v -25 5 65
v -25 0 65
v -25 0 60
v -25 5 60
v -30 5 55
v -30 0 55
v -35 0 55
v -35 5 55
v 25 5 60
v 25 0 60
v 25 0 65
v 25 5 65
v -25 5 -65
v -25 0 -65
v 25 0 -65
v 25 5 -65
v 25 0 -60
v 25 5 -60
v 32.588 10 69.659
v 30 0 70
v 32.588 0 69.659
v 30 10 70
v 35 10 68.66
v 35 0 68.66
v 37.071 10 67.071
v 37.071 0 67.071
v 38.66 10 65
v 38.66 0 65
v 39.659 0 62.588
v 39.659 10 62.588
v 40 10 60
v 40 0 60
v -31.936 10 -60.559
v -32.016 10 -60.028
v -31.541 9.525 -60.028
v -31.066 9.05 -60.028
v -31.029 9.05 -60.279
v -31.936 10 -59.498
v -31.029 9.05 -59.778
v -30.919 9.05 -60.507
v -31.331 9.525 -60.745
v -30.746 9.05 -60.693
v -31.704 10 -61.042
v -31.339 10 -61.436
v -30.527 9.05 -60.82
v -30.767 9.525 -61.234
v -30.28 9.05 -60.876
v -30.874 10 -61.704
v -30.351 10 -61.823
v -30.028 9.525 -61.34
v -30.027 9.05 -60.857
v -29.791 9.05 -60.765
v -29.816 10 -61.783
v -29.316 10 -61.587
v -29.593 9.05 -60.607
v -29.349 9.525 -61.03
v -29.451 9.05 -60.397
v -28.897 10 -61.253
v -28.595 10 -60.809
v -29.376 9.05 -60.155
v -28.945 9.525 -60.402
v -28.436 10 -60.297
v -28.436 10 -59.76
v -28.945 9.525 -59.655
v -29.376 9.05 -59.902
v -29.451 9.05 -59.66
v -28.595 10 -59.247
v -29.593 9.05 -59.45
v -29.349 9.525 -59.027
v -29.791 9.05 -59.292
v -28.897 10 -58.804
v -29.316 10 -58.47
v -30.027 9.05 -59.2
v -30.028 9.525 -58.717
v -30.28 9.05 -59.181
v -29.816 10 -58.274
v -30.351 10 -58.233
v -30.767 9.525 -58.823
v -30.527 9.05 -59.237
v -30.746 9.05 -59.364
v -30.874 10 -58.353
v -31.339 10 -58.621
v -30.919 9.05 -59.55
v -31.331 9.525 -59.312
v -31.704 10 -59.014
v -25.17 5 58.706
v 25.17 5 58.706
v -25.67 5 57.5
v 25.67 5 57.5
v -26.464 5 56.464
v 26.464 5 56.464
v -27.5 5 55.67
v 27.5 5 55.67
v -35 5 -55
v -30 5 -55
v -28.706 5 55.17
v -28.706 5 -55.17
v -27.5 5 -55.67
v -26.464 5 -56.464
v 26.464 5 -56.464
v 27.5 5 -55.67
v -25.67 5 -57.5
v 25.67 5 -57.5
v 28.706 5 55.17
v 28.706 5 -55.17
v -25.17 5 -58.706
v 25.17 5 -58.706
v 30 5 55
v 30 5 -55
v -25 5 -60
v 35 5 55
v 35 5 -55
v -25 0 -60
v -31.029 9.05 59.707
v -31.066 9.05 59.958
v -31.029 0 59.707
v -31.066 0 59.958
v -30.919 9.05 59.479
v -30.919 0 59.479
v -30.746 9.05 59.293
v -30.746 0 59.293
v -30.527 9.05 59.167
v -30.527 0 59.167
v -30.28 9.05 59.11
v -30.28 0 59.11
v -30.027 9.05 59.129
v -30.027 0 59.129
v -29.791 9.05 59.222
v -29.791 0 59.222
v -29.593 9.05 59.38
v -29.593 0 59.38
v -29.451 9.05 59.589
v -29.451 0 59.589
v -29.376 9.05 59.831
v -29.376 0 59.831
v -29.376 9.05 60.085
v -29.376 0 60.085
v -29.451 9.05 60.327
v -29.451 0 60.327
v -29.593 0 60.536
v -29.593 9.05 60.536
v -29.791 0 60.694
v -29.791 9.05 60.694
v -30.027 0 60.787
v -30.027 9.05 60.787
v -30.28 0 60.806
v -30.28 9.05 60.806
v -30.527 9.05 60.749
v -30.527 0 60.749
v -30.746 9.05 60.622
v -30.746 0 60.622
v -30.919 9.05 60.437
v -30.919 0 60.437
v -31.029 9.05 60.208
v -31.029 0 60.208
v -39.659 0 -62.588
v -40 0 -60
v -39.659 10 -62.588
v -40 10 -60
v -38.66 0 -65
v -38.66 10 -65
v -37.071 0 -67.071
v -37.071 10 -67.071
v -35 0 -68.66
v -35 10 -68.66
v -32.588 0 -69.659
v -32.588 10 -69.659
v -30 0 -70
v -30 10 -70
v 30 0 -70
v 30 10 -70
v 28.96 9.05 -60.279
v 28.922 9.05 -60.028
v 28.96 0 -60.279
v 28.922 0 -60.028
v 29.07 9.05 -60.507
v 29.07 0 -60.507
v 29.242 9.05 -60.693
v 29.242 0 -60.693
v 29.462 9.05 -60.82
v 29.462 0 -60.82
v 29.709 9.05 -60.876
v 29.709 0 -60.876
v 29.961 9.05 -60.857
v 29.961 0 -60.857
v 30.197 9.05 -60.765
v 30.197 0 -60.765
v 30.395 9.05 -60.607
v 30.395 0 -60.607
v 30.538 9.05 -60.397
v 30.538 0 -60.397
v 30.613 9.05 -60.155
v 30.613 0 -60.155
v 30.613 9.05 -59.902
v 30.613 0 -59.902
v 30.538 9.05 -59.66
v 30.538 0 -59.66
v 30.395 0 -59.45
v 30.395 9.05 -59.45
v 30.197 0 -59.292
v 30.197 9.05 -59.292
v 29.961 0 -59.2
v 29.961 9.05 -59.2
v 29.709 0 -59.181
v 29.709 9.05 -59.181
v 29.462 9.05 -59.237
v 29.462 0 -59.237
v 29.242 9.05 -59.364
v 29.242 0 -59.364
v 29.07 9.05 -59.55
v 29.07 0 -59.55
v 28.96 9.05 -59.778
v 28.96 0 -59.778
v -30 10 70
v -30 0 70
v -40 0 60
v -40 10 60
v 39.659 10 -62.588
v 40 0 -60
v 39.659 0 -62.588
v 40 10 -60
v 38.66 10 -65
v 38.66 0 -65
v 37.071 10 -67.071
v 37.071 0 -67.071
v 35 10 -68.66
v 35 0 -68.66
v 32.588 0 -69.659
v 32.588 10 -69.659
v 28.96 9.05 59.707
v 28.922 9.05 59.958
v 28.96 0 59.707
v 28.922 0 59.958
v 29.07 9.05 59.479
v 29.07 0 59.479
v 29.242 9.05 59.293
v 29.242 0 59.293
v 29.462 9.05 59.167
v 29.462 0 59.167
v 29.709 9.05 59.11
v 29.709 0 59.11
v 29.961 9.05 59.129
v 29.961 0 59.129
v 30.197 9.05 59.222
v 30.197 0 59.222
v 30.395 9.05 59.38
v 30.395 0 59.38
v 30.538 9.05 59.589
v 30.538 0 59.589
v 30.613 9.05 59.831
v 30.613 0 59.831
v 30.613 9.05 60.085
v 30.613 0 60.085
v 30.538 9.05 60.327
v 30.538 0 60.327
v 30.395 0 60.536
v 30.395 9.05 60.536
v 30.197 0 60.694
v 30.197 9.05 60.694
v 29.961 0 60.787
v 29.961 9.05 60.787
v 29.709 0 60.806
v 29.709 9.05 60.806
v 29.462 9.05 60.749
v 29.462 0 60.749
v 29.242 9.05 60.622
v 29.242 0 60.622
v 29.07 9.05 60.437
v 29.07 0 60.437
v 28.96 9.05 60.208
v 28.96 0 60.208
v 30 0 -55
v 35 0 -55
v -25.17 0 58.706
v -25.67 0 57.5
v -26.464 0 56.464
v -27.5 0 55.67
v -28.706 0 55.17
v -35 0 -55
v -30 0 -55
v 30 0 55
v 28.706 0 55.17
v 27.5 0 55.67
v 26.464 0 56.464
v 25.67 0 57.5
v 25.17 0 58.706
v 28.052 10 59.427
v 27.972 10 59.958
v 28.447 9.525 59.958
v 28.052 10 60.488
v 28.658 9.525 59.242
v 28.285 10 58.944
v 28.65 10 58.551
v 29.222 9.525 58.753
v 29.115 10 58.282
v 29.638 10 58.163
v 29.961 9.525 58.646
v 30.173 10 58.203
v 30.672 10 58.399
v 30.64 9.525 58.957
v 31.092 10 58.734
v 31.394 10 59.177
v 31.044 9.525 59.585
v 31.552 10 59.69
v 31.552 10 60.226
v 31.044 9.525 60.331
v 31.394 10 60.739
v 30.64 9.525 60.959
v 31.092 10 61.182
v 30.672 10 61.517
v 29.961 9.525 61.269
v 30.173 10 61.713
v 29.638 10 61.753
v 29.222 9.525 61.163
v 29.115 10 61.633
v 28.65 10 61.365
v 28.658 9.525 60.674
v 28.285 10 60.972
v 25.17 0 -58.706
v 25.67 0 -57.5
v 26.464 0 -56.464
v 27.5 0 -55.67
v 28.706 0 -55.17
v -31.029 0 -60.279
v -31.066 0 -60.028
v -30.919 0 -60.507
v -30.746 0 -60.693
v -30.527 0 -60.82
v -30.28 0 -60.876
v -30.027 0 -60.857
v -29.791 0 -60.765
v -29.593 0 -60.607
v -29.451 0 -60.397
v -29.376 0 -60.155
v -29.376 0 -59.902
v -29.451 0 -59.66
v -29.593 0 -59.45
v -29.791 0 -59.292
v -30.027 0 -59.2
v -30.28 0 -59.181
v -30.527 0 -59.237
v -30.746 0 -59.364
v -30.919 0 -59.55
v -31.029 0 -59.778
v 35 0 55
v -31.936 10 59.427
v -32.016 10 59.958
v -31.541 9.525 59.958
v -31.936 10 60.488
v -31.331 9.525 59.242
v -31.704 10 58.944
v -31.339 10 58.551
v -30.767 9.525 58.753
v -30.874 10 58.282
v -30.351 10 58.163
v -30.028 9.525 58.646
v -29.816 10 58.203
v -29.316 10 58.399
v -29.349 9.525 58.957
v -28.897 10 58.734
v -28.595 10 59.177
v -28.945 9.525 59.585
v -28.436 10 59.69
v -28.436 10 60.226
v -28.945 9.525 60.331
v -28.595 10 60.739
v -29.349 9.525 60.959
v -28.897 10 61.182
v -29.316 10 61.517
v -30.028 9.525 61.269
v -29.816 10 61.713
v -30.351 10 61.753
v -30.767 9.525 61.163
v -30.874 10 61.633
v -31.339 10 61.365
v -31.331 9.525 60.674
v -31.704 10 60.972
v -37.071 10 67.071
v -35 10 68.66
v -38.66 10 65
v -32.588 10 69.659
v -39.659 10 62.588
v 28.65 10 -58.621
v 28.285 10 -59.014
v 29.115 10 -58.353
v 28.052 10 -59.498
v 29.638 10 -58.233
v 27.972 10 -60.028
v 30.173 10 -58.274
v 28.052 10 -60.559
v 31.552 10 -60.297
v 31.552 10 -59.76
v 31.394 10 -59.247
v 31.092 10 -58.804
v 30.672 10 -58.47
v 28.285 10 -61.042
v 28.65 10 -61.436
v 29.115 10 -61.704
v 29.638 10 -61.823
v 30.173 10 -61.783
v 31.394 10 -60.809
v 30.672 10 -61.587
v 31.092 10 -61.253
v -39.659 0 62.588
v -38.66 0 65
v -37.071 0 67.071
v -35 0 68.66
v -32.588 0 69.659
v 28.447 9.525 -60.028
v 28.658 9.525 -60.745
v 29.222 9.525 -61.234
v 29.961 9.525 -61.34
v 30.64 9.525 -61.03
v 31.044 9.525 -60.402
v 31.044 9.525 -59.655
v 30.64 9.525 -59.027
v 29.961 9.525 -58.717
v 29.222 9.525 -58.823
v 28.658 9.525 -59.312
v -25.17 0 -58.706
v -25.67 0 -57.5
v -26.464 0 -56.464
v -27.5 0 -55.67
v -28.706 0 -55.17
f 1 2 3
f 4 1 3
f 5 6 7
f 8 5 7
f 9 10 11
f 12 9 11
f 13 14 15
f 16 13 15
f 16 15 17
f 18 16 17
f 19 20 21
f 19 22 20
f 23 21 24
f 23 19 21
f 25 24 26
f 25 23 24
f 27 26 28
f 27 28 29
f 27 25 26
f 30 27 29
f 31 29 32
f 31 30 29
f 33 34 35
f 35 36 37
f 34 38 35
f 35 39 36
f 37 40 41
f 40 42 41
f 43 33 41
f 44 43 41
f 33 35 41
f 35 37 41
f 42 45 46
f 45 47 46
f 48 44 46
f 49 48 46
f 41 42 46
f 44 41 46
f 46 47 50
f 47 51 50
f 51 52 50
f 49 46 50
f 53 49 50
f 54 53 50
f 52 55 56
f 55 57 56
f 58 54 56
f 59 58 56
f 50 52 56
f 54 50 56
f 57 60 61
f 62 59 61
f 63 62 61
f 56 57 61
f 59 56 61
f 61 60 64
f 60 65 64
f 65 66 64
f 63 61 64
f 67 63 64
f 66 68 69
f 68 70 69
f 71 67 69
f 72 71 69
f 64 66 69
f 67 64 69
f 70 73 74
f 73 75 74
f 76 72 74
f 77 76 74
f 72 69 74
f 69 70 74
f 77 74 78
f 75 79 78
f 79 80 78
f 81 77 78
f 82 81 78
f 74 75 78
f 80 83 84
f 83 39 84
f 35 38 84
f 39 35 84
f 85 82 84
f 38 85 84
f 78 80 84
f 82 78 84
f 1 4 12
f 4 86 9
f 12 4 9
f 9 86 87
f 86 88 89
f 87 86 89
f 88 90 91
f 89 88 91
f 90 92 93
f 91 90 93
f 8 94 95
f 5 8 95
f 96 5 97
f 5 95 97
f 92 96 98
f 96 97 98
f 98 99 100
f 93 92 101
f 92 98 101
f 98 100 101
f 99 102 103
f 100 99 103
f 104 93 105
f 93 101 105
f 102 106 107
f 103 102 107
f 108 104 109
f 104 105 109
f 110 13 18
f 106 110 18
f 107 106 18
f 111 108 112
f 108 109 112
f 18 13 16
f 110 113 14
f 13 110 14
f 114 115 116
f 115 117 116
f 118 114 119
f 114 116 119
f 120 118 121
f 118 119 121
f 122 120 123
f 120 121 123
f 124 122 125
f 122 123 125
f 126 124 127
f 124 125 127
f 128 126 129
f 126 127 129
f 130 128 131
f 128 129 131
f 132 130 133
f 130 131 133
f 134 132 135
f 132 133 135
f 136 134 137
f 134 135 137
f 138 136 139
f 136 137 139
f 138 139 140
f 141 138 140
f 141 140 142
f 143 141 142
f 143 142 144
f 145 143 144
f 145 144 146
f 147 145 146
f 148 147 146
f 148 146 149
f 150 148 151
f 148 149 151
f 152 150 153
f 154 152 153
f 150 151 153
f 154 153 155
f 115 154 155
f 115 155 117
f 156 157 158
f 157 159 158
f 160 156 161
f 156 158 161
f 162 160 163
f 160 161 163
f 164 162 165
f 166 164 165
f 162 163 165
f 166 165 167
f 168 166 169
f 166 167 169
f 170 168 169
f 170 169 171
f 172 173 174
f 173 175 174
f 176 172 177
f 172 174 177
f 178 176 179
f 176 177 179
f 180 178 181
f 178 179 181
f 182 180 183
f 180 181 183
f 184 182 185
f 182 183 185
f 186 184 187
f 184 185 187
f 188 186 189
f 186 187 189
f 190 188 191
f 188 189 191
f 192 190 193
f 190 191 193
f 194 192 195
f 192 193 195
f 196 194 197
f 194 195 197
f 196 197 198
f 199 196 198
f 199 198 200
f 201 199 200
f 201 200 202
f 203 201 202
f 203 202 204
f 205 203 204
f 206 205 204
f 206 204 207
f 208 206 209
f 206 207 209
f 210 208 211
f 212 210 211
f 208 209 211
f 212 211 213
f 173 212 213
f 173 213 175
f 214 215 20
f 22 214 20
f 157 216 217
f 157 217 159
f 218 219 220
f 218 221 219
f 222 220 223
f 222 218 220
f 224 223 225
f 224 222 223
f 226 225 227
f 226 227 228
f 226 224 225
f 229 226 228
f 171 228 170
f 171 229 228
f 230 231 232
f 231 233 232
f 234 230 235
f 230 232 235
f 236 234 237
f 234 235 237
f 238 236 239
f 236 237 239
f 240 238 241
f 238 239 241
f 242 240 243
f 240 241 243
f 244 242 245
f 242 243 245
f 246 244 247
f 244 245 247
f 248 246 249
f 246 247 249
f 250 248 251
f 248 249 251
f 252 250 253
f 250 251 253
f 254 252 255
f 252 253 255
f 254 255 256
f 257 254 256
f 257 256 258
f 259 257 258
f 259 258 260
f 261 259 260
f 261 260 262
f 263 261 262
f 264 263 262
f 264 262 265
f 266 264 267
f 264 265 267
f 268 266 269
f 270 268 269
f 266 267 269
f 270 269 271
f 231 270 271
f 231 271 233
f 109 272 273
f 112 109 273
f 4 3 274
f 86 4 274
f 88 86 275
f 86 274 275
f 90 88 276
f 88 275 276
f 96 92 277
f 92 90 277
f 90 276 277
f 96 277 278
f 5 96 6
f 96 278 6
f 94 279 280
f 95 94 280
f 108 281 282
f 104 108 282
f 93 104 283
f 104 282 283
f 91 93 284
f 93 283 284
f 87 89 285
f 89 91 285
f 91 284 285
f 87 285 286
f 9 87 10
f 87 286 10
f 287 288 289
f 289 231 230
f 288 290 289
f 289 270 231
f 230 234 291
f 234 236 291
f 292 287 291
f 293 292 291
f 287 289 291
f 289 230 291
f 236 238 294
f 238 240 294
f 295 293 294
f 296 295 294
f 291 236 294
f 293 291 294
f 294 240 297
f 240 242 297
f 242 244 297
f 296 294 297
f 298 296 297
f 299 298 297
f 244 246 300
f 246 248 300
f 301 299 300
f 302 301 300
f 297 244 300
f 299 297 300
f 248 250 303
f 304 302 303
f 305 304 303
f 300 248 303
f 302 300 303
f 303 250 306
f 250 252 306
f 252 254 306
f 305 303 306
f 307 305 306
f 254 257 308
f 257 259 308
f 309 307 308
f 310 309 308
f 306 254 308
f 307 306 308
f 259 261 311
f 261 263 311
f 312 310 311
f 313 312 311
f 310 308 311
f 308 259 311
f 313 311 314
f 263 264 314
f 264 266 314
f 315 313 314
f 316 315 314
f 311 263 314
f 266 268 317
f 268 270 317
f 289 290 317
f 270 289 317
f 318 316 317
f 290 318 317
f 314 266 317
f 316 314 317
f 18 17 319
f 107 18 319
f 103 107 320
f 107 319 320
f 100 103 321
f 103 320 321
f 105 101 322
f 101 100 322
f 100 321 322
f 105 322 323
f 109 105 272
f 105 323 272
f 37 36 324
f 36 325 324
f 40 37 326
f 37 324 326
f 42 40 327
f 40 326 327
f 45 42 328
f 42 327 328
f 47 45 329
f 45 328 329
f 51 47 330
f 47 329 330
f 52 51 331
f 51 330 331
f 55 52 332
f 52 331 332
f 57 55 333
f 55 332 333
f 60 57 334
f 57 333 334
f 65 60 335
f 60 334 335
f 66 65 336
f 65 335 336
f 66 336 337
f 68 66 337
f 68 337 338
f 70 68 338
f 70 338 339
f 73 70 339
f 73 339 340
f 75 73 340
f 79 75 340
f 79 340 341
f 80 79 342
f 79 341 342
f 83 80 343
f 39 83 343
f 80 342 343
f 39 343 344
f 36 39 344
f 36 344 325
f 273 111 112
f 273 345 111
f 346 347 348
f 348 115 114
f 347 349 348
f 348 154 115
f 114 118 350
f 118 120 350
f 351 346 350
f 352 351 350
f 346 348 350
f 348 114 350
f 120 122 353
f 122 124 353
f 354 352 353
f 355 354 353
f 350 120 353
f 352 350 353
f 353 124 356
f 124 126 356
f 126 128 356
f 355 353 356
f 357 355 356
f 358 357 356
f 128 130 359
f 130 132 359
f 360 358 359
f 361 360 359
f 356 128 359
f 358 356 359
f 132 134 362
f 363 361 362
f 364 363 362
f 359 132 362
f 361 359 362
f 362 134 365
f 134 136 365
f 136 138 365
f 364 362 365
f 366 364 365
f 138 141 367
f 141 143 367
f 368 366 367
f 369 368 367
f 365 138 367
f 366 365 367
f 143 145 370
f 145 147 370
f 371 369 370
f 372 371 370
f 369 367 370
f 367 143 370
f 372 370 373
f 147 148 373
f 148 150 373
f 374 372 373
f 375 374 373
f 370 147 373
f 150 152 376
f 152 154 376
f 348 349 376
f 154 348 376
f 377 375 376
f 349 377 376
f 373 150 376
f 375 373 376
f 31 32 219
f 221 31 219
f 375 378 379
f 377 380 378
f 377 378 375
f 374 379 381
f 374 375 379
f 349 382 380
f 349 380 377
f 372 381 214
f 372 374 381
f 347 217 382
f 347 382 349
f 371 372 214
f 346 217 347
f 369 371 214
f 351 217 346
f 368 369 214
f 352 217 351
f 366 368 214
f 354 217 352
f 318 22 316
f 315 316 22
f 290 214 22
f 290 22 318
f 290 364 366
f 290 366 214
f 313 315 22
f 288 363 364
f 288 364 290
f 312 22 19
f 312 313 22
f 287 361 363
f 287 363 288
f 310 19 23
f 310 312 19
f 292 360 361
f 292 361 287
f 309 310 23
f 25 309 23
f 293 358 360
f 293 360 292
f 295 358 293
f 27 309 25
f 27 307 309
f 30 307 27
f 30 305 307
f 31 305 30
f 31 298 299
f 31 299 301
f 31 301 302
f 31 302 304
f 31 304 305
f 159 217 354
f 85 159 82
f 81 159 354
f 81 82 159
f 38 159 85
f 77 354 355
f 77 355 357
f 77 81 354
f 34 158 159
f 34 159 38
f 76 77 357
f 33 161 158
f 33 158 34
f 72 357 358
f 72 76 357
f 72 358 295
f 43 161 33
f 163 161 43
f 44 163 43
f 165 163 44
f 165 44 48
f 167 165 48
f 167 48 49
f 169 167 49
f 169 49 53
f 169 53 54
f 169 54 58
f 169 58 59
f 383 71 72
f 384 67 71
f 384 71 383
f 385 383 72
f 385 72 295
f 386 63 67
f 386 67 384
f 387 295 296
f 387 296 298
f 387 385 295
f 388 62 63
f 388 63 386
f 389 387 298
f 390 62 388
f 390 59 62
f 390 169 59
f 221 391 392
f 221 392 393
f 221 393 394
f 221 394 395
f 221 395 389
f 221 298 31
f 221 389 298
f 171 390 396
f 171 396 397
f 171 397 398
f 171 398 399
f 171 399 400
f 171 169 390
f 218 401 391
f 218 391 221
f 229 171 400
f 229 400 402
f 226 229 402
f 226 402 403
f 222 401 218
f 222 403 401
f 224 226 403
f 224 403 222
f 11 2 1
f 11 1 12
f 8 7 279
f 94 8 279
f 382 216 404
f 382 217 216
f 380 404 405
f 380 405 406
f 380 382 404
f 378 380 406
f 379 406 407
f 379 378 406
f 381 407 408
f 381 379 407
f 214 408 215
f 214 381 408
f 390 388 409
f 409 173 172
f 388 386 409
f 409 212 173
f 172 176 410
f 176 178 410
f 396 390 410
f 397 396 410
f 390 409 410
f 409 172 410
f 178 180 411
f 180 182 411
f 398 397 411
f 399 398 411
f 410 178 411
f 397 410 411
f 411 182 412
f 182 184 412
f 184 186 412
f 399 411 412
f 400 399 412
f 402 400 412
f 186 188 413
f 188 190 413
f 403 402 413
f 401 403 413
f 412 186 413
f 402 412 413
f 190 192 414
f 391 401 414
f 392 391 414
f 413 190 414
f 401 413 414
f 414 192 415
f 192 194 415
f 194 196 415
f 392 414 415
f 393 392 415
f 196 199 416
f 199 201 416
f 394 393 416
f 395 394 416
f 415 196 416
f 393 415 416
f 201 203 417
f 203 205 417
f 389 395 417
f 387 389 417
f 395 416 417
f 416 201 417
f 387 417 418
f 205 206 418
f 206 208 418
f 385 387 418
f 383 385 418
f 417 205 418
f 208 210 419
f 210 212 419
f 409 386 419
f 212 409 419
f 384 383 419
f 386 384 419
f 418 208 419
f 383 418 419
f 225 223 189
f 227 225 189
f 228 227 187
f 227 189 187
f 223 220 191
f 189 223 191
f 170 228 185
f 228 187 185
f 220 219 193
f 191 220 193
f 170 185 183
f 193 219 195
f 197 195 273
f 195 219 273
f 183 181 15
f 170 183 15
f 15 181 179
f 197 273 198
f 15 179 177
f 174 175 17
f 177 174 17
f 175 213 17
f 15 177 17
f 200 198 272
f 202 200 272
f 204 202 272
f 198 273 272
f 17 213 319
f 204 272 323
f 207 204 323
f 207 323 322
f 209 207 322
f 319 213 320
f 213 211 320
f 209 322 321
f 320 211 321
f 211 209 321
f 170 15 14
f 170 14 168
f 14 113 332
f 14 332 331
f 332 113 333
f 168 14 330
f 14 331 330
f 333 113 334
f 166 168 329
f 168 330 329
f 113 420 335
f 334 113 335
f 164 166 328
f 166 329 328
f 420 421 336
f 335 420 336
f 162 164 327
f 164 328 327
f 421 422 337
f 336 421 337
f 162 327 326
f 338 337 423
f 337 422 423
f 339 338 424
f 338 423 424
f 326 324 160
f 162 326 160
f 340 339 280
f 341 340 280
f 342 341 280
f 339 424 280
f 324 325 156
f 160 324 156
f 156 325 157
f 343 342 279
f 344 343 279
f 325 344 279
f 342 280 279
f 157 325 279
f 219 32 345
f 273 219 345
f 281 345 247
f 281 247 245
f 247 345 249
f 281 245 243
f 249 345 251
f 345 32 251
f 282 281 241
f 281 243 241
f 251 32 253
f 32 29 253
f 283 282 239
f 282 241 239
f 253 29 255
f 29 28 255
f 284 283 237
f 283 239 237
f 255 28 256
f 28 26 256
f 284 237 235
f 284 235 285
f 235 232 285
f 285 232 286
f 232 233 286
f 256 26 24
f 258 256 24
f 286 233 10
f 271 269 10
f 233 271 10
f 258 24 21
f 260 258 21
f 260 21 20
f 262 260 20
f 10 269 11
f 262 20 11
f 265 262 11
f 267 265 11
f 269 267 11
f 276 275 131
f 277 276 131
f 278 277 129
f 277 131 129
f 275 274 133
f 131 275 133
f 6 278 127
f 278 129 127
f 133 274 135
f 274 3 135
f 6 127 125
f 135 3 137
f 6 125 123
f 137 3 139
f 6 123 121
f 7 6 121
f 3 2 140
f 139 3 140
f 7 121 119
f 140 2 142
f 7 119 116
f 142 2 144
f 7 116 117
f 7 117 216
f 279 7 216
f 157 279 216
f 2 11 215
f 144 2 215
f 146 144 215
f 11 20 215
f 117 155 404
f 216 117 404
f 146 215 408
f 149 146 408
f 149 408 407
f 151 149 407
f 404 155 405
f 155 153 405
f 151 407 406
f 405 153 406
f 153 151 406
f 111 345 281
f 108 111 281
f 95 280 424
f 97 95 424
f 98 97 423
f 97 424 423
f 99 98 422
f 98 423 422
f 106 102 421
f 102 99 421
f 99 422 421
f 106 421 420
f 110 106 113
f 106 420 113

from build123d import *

# Parameters (mm, degrees)
SKETCH2_W                                            = 80
SKETCH2_H                                            = 140
BOSS_EXTRUDE1_DEPTH                                  = 10
SHELL2_T                                             = -5
BOSS_EXTRUDE4_REACH                                  = 83.24
FILLET3_R                                            = 10
CSK_FOR_M1_6_CROSS_RECESS_FLAT_HEAD_SCRE_D           = 1.7
CSK_FOR_M1_6_CROSS_RECESS_FLAT_HEAD_SCRE_CSINK_D     = 3.6
CSK_FOR_M1_6_CROSS_RECESS_FLAT_HEAD_SCRE_CSINK_ANGLE = 90


with BuildPart() as part:
    # Sketch2 → Boss-Extrude1 (new body)
    with BuildSketch(Plane(origin=(0, 0, 0), x_dir=(1, 0, 0), z_dir=(0, 1, 0))):
        Rectangle(SKETCH2_W, SKETCH2_H)
    extrude(amount=BOSS_EXTRUDE1_DEPTH)

    # Shell2
    shell2_openings = [part.faces().sort_by_distance(p)[0] for p in [
        (0, 0, 0),
    ]]
    offset(amount=SHELL2_T, openings=shell2_openings, kind=Kind.INTERSECTION)

    # Sketch6 → Boss-Extrude4 (add, up to next)
    with BuildSketch(Plane.XZ, mode=Mode.PRIVATE) as boss_extrude4_sk1:
        with BuildLine():
            Line((-30, 55), (-35, 55))
            Line((-35, 55), (-35, 65))
            Line((-35, 65), (-25, 65))
            Line((-25, 65), (-25, 60))
            ThreePointArc((-25, 60), (-26.464466094, 56.464466094), (-30, 55))
        make_face()
    boss_extrude4_tool1 = extrude(boss_extrude4_sk1.sketch, amount=-BOSS_EXTRUDE4_REACH, mode=Mode.PRIVATE) - part.part
    # Sketch6 → Boss-Extrude4 (add, up to next)
    with BuildSketch(Plane.XZ, mode=Mode.PRIVATE) as boss_extrude4_sk2:
        with BuildLine():
            Line((25, 60), (25, 65))
            Line((25, 65), (35, 65))
            Line((35, 65), (35, 55))
            Line((35, 55), (30, 55))
            ThreePointArc((30, 55), (26.464466094, 56.464466094), (25, 60))
        make_face()
    boss_extrude4_tool2 = extrude(boss_extrude4_sk2.sketch, amount=-BOSS_EXTRUDE4_REACH, mode=Mode.PRIVATE) - part.part
    # Sketch6 → Boss-Extrude4 (add, up to next)
    with BuildSketch(Plane.XZ, mode=Mode.PRIVATE) as boss_extrude4_sk3:
        with BuildLine():
            Line((30, -55), (35, -55))
            Line((35, -55), (35, -65))
            Line((35, -65), (25, -65))
            Line((25, -65), (25, -60))
            ThreePointArc((25, -60), (26.464466094, -56.464466094), (30, -55))
        make_face()
    boss_extrude4_tool3 = extrude(boss_extrude4_sk3.sketch, amount=-BOSS_EXTRUDE4_REACH, mode=Mode.PRIVATE) - part.part
    # Sketch6 → Boss-Extrude4 (add, up to next)
    with BuildSketch(Plane.XZ, mode=Mode.PRIVATE) as boss_extrude4_sk4:
        with BuildLine():
            Line((-25, -60), (-25, -65))
            Line((-25, -65), (-35, -65))
            Line((-35, -65), (-35, -55))
            Line((-35, -55), (-30, -55))
            ThreePointArc((-30, -55), (-26.464466094, -56.464466094), (-25, -60))
        make_face()
    boss_extrude4_tool4 = extrude(boss_extrude4_sk4.sketch, amount=-BOSS_EXTRUDE4_REACH, mode=Mode.PRIVATE) - part.part
    add(boss_extrude4_tool1.solids().sort_by_distance((-30.220144, 0, 60.220144))[0])
    add(boss_extrude4_tool2.solids().sort_by_distance((30.220144, 0, 60.220144))[0])
    add(boss_extrude4_tool3.solids().sort_by_distance((30.220144, 0, -60.220144))[0])
    add(boss_extrude4_tool4.solids().sort_by_distance((-30.220144, 0, -60.220144))[0])

    # Fillet3
    fillet3_edges = [part.edges().sort_by_distance(p)[0] for p in [
        (40, 5, 70),
        (-40, 5, 70),
        (-40, 5, -70),
        (40, 5, -70),
    ]]
    fillet(fillet3_edges, radius=FILLET3_R)

    # CSK for M1.6 Cross Recess Flat Head Screw1 (through all)
    with Locations(Plane(origin=(0, 10, 0), x_dir=(1, 0, 0), z_dir=(0, 1, 0))):
        with Locations((-30.216332876, 60.028429813), (29.772350977, 60.028429813), (29.772350977, -59.957909435), (-30.216332876, -59.957909435)):
            CounterSinkHole(CSK_FOR_M1_6_CROSS_RECESS_FLAT_HEAD_SCRE_D / 2, CSK_FOR_M1_6_CROSS_RECESS_FLAT_HEAD_SCRE_CSINK_D / 2, counter_sink_angle=CSK_FOR_M1_6_CROSS_RECESS_FLAT_HEAD_SCRE_CSINK_ANGLE)


solid = part.part
